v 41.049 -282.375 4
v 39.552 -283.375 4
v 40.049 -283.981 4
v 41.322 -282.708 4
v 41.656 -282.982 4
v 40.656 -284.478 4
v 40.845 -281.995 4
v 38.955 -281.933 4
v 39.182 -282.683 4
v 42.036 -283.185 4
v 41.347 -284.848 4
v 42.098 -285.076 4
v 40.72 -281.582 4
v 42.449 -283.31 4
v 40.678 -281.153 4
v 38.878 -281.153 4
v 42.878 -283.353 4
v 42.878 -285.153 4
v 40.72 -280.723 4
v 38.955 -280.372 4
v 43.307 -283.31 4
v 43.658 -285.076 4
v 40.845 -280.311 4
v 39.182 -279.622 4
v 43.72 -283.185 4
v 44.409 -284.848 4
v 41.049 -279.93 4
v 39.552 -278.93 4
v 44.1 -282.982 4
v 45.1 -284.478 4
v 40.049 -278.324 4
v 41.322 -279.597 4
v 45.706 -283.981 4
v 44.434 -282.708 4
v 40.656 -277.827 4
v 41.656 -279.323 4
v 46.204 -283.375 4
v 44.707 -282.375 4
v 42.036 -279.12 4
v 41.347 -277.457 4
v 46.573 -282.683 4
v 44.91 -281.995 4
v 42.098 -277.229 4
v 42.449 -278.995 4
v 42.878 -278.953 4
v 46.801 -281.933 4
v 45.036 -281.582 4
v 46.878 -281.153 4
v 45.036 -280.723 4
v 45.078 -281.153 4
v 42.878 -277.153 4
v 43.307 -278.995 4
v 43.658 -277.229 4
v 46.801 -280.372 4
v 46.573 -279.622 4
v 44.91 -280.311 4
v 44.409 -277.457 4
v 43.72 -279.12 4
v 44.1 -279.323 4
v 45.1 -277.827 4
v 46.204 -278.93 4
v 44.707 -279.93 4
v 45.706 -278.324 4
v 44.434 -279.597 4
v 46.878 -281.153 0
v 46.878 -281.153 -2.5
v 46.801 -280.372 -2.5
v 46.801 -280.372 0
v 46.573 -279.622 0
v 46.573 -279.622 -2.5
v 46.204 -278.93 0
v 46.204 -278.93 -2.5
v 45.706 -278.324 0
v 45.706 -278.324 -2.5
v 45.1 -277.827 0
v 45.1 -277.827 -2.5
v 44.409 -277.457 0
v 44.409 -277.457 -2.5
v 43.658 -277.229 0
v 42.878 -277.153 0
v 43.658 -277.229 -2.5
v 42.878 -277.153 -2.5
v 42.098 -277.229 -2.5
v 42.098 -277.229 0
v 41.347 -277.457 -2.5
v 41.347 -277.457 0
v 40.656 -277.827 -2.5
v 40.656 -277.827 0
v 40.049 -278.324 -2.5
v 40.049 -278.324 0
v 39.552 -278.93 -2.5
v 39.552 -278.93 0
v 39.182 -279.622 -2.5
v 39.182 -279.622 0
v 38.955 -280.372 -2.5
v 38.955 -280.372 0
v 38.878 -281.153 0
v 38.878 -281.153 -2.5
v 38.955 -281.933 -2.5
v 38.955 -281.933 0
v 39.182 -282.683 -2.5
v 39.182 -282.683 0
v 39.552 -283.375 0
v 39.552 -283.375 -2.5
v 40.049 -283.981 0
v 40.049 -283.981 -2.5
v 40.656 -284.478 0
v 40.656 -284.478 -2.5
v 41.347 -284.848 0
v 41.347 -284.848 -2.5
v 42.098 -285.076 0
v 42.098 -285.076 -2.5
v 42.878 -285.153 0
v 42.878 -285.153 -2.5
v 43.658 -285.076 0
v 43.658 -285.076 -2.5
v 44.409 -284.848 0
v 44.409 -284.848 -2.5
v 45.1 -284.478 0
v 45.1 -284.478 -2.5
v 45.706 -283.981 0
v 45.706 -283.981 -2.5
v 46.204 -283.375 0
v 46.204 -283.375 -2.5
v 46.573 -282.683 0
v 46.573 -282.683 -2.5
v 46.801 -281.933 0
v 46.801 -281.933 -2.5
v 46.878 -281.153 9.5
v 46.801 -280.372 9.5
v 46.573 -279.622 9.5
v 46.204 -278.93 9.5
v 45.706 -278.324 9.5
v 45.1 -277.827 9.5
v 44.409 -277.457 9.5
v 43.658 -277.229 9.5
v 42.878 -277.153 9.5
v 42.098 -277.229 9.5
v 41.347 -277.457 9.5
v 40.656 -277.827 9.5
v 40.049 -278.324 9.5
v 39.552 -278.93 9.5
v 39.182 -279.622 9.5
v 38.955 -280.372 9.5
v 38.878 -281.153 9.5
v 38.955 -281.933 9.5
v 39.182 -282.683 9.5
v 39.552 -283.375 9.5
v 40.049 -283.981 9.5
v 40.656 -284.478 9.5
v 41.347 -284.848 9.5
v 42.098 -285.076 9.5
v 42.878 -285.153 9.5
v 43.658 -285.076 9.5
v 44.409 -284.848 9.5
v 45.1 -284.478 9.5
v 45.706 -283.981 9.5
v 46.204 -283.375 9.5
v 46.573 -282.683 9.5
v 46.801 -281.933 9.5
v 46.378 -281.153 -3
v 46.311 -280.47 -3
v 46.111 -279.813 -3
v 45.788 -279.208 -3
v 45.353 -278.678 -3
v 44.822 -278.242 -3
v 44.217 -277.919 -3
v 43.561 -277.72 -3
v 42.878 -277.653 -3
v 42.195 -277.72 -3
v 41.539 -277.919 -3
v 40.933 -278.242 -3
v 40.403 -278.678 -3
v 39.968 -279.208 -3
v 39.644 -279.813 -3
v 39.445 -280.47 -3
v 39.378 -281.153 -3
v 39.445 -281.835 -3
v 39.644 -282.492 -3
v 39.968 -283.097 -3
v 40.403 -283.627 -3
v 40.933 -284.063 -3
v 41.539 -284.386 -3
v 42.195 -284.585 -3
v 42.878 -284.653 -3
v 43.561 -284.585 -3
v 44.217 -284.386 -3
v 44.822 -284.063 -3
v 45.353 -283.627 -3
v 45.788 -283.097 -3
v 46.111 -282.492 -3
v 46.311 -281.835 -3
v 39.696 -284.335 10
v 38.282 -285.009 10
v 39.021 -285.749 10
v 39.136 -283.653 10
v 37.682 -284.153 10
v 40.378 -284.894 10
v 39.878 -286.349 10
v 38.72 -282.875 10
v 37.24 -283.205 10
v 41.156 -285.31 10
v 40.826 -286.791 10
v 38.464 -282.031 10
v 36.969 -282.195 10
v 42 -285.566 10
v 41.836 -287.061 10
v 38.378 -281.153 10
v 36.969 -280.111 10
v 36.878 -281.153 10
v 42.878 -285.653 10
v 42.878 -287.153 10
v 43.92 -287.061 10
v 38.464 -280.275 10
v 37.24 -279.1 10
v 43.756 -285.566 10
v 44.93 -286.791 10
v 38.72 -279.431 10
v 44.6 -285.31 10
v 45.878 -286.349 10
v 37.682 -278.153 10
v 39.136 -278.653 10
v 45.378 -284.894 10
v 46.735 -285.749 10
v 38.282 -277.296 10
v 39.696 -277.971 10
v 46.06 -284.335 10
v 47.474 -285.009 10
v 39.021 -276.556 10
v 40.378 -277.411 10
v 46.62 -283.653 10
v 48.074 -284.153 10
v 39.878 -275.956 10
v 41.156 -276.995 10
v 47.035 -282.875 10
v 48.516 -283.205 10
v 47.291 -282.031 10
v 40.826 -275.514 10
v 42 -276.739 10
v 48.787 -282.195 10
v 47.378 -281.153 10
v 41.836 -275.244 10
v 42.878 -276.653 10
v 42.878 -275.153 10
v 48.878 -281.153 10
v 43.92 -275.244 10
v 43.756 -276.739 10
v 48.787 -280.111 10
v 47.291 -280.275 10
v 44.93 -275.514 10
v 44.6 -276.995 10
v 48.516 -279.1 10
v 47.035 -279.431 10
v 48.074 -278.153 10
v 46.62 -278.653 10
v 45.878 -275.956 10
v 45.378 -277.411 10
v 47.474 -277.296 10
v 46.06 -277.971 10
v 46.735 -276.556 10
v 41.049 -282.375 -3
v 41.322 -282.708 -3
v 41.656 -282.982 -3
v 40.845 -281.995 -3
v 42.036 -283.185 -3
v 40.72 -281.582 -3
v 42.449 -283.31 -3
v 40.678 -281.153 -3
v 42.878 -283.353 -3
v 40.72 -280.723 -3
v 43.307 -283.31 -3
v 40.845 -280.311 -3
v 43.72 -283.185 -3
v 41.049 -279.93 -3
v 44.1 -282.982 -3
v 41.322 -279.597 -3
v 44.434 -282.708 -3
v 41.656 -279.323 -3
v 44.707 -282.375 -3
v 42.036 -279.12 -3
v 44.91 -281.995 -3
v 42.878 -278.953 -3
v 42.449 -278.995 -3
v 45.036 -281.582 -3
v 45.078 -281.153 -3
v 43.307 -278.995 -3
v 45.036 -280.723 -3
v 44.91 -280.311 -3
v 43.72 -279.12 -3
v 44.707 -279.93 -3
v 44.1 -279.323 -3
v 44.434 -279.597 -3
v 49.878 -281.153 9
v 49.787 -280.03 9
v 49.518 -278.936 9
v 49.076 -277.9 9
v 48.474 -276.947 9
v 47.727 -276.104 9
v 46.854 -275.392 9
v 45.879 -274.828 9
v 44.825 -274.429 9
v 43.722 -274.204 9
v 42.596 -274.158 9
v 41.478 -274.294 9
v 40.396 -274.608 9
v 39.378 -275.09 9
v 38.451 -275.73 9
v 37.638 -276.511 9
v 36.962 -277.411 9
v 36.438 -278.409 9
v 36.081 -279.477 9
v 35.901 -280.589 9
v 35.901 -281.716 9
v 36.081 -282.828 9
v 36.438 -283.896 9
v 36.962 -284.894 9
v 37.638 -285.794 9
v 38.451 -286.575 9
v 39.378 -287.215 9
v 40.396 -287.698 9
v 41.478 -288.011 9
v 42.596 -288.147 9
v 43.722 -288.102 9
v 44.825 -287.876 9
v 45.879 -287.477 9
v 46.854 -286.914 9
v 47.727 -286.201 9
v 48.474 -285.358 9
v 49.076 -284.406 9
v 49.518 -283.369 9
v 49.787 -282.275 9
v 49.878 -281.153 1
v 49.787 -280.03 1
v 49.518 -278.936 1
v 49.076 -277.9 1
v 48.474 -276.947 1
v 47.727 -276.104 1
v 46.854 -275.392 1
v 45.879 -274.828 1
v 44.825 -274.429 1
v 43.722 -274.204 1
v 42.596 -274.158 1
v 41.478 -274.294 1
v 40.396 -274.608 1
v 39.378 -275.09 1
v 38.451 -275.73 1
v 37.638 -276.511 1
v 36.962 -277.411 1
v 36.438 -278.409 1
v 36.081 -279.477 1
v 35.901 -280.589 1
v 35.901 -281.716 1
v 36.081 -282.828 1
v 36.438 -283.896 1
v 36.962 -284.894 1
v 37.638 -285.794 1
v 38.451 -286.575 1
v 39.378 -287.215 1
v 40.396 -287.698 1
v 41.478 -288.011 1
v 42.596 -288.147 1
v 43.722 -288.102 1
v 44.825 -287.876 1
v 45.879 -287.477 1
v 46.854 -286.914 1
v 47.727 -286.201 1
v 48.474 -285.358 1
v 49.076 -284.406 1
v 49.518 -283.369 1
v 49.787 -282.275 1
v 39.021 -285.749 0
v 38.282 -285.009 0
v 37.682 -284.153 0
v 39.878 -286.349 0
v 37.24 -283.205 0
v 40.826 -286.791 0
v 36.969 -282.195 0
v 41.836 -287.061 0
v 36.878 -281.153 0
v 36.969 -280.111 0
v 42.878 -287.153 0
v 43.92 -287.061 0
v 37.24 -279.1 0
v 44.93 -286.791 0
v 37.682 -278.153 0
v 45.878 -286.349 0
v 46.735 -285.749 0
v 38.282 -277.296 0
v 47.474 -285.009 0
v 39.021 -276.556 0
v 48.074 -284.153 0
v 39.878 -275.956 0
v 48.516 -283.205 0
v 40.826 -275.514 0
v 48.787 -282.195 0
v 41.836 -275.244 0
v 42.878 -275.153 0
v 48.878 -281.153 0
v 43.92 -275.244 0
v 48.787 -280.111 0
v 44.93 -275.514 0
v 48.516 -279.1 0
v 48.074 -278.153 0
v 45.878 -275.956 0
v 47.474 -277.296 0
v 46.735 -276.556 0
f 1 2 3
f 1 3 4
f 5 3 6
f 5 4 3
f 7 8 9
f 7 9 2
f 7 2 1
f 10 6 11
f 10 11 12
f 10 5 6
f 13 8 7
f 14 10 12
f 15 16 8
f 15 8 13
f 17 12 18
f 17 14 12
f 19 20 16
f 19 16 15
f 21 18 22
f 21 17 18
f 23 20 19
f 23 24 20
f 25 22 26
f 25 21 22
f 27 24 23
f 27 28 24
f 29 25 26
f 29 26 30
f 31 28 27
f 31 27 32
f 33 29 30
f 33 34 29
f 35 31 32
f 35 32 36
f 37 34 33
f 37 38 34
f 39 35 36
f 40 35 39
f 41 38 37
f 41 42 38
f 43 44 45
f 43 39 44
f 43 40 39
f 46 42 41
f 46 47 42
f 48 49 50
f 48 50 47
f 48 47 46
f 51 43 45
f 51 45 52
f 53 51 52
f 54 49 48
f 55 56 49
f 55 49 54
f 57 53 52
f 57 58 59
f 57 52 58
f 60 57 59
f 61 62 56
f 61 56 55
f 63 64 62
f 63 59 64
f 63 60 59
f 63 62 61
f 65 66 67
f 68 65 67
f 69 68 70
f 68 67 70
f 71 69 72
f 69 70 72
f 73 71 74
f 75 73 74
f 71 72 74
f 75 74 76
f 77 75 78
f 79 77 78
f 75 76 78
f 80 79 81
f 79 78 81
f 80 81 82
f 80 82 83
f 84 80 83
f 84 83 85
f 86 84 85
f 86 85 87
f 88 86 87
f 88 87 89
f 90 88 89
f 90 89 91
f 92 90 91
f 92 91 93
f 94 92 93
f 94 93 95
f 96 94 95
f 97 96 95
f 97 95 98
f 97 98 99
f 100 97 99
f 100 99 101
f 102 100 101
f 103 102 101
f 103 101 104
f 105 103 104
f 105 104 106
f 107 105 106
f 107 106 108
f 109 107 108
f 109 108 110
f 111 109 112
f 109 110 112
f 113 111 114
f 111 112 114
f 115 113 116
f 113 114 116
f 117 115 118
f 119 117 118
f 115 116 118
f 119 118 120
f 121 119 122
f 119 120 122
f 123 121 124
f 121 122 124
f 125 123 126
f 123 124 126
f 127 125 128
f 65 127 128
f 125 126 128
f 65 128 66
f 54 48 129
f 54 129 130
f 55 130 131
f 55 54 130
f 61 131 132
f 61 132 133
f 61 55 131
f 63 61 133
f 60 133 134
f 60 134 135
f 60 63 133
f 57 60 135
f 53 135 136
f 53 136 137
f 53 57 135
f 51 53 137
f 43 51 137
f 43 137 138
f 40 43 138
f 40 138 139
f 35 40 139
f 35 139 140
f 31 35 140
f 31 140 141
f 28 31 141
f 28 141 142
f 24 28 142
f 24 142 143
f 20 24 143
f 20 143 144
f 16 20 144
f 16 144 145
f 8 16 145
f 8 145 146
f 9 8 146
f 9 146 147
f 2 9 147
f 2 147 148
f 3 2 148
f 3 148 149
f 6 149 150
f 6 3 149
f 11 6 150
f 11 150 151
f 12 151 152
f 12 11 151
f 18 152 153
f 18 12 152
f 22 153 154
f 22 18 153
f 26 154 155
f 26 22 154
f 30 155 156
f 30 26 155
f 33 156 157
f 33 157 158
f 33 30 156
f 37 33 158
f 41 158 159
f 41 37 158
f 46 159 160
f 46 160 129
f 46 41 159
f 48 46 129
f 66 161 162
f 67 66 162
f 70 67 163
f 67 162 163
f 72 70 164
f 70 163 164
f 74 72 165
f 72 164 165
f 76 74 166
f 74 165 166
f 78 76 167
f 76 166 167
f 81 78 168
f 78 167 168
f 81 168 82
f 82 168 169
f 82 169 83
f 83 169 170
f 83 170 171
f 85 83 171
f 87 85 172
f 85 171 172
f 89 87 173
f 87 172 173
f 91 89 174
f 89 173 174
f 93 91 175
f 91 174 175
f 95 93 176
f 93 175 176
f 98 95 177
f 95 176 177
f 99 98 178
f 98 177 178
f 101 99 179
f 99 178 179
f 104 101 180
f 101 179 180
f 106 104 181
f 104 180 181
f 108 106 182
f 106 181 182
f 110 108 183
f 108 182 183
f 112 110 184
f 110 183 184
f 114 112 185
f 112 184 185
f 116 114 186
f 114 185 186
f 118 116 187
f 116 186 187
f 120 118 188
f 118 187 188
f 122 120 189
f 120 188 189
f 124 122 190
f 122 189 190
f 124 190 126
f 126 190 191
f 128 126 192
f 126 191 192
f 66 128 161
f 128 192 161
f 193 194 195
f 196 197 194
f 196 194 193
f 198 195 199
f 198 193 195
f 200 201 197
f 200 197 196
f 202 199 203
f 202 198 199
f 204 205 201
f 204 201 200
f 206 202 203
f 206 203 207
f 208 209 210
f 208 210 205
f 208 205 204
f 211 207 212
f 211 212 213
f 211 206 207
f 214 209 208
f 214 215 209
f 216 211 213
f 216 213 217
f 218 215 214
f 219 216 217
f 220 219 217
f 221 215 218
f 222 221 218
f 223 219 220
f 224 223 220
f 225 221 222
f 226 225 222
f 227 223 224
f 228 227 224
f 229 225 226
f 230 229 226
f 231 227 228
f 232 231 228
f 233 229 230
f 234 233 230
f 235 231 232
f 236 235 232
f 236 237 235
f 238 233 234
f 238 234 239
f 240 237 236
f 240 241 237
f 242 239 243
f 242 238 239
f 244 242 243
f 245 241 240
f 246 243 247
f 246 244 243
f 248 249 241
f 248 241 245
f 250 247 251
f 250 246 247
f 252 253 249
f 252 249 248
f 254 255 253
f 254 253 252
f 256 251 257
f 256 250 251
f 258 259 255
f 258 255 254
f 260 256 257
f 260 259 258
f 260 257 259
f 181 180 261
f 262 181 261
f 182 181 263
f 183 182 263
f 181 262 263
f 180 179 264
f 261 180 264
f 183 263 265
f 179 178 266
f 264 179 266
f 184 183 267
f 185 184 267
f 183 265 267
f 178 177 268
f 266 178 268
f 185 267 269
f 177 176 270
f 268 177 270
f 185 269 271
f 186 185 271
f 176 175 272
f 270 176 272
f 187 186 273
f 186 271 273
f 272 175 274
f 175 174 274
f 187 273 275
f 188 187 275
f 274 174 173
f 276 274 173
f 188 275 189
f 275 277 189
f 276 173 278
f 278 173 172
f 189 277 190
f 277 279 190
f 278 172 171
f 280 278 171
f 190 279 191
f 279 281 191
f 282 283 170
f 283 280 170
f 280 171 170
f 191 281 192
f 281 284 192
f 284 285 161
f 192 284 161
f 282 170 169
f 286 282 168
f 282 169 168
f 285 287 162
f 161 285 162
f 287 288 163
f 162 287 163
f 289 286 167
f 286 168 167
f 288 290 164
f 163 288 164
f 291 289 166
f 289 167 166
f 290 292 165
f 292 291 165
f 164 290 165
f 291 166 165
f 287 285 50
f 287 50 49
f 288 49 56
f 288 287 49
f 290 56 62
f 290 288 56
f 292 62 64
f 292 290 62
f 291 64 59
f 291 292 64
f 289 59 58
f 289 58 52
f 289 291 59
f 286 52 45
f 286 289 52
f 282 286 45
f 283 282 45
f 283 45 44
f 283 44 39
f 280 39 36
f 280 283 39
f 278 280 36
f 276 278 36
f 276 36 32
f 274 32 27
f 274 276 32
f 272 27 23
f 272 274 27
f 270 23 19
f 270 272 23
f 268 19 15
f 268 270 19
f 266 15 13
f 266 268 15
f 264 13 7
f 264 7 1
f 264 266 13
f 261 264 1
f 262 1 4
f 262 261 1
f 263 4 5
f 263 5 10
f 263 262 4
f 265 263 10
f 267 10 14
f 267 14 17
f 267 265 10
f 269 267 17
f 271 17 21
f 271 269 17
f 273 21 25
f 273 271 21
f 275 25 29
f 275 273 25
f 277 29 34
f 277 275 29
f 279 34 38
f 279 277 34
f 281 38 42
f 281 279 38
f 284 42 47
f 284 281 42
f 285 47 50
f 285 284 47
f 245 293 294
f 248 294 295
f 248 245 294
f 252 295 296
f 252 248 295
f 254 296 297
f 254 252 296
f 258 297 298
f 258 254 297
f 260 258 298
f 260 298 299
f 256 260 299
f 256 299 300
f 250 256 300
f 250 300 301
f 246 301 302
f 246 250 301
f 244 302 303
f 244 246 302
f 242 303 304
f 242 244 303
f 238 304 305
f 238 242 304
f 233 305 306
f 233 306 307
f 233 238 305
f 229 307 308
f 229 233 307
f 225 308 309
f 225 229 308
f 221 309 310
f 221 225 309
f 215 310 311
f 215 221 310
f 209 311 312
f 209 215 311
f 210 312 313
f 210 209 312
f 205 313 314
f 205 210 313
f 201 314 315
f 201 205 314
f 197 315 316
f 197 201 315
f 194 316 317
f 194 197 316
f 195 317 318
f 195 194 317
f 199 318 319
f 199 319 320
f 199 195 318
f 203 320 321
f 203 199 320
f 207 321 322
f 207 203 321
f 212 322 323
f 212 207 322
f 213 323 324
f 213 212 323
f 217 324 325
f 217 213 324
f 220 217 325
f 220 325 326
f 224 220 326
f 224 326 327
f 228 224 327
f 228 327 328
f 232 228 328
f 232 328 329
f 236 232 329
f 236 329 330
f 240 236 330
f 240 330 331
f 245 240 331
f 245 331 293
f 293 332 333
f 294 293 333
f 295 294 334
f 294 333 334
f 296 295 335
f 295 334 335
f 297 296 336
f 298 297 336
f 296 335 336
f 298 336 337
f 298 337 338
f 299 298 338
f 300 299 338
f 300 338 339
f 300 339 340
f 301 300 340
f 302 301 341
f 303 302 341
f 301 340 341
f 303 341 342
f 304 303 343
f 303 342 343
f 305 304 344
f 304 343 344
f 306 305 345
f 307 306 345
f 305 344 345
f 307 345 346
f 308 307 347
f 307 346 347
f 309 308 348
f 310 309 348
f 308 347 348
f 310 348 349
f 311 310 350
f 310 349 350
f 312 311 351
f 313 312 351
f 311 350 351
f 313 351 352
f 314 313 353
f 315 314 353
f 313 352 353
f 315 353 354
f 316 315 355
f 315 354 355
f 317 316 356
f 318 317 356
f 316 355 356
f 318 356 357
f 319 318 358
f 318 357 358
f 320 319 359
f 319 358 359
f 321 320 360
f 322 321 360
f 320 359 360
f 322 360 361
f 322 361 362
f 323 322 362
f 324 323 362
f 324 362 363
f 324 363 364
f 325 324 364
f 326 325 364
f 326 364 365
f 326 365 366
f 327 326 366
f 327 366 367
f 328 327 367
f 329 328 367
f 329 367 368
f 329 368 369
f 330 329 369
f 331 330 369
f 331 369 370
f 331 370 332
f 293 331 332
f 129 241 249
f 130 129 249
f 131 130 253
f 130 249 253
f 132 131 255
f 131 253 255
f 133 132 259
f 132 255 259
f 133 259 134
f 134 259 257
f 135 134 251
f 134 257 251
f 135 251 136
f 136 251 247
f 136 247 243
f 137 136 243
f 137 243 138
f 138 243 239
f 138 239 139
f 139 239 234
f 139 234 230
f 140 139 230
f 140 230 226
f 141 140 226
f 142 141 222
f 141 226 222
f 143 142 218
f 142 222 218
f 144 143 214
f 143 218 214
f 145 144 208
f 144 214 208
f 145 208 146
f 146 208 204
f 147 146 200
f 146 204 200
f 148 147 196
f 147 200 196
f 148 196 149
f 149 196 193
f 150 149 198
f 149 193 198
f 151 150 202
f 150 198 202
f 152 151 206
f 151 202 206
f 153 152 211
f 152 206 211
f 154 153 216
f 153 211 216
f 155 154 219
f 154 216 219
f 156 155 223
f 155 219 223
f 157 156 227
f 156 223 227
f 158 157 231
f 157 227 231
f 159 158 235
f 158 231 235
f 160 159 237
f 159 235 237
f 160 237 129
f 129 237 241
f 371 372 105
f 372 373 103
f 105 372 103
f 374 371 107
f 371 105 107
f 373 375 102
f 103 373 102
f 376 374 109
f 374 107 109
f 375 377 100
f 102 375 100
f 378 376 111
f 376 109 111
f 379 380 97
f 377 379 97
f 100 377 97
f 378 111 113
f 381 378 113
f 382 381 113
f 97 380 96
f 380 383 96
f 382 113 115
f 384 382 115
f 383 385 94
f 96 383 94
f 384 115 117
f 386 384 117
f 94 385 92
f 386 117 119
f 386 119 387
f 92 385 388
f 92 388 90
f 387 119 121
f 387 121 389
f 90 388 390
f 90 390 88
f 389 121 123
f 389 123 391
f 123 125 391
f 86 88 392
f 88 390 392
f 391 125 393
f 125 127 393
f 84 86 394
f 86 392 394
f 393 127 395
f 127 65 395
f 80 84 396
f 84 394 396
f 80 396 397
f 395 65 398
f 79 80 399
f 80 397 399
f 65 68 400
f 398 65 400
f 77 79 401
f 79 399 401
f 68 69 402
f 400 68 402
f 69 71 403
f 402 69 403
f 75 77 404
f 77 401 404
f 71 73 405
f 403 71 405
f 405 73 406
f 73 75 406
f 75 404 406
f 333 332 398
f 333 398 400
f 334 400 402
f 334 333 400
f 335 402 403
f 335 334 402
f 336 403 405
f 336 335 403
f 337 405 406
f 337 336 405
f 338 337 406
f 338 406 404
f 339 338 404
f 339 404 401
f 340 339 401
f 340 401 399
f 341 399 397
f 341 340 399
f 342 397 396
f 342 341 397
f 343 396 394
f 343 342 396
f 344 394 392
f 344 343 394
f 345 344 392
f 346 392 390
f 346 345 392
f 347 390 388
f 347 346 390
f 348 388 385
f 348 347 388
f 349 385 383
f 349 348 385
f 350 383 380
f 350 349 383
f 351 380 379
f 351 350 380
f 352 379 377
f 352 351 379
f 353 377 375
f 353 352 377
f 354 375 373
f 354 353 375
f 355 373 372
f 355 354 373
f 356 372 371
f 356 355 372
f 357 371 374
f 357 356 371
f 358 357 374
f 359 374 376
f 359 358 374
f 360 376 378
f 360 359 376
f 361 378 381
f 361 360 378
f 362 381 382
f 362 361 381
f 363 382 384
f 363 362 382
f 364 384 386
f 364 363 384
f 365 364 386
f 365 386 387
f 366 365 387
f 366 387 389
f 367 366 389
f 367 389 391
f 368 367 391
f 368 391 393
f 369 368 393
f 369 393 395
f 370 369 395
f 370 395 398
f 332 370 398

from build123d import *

# Parameters (mm, degrees)
SKETCH_1_R      = 7
SKETCH_1_R_2    = 4
EXTRUDE_1_DEPTH = 10
SKETCH_2_R      = 4
SKETCH_2_R_2    = 2.2
EXTRUDE_2_DEPTH = 7
CHAMFER_1_SIZE  = 1
CHAMFER_2_SIZE  = 0.5
CHAMFER_3_SIZE  = 0.5


with BuildPart() as part:
    # 草图1 → 凸台-拉伸1 (new body)
    with BuildSketch(Plane.XY):
        with Locations((42.877900702, -281.152618372)):
            Circle(SKETCH_1_R)
        with Locations((42.877900702, -281.152618372)):
            Circle(SKETCH_1_R_2, mode=Mode.SUBTRACT)
    extrude(amount=EXTRUDE_1_DEPTH)

    # 草图2 → 凸台-拉伸2 (add)
    with BuildSketch(Plane.XY.offset(-3)):
        with Locations((42.877900702, -281.152618372)):
            Circle(SKETCH_2_R)
        with Locations((42.877900702, -281.152618372)):
            Circle(SKETCH_2_R_2, mode=Mode.SUBTRACT)
    extrude(amount=EXTRUDE_2_DEPTH)

    # 倒角1
    chamfer_1_edges = [part.edges().sort_by_distance(p)[0] for p in [
        (35.877900702, -281.152618372, 0),
        (35.877900702, -281.152618372, 10),
    ]]
    chamfer(chamfer_1_edges, length=CHAMFER_1_SIZE)

    # 倒角2
    chamfer_2_edges = [part.edges().sort_by_distance(p)[0] for p in [
        (38.877900702, -281.152618372, -3),
    ]]
    chamfer(chamfer_2_edges, length=CHAMFER_2_SIZE)

    # 倒角3
    chamfer_3_edges = [part.edges().sort_by_distance(p)[0] for p in [
        (38.877900702, -281.152618372, 10),
    ]]
    chamfer(chamfer_3_edges, length=CHAMFER_3_SIZE)


solid = part.part
